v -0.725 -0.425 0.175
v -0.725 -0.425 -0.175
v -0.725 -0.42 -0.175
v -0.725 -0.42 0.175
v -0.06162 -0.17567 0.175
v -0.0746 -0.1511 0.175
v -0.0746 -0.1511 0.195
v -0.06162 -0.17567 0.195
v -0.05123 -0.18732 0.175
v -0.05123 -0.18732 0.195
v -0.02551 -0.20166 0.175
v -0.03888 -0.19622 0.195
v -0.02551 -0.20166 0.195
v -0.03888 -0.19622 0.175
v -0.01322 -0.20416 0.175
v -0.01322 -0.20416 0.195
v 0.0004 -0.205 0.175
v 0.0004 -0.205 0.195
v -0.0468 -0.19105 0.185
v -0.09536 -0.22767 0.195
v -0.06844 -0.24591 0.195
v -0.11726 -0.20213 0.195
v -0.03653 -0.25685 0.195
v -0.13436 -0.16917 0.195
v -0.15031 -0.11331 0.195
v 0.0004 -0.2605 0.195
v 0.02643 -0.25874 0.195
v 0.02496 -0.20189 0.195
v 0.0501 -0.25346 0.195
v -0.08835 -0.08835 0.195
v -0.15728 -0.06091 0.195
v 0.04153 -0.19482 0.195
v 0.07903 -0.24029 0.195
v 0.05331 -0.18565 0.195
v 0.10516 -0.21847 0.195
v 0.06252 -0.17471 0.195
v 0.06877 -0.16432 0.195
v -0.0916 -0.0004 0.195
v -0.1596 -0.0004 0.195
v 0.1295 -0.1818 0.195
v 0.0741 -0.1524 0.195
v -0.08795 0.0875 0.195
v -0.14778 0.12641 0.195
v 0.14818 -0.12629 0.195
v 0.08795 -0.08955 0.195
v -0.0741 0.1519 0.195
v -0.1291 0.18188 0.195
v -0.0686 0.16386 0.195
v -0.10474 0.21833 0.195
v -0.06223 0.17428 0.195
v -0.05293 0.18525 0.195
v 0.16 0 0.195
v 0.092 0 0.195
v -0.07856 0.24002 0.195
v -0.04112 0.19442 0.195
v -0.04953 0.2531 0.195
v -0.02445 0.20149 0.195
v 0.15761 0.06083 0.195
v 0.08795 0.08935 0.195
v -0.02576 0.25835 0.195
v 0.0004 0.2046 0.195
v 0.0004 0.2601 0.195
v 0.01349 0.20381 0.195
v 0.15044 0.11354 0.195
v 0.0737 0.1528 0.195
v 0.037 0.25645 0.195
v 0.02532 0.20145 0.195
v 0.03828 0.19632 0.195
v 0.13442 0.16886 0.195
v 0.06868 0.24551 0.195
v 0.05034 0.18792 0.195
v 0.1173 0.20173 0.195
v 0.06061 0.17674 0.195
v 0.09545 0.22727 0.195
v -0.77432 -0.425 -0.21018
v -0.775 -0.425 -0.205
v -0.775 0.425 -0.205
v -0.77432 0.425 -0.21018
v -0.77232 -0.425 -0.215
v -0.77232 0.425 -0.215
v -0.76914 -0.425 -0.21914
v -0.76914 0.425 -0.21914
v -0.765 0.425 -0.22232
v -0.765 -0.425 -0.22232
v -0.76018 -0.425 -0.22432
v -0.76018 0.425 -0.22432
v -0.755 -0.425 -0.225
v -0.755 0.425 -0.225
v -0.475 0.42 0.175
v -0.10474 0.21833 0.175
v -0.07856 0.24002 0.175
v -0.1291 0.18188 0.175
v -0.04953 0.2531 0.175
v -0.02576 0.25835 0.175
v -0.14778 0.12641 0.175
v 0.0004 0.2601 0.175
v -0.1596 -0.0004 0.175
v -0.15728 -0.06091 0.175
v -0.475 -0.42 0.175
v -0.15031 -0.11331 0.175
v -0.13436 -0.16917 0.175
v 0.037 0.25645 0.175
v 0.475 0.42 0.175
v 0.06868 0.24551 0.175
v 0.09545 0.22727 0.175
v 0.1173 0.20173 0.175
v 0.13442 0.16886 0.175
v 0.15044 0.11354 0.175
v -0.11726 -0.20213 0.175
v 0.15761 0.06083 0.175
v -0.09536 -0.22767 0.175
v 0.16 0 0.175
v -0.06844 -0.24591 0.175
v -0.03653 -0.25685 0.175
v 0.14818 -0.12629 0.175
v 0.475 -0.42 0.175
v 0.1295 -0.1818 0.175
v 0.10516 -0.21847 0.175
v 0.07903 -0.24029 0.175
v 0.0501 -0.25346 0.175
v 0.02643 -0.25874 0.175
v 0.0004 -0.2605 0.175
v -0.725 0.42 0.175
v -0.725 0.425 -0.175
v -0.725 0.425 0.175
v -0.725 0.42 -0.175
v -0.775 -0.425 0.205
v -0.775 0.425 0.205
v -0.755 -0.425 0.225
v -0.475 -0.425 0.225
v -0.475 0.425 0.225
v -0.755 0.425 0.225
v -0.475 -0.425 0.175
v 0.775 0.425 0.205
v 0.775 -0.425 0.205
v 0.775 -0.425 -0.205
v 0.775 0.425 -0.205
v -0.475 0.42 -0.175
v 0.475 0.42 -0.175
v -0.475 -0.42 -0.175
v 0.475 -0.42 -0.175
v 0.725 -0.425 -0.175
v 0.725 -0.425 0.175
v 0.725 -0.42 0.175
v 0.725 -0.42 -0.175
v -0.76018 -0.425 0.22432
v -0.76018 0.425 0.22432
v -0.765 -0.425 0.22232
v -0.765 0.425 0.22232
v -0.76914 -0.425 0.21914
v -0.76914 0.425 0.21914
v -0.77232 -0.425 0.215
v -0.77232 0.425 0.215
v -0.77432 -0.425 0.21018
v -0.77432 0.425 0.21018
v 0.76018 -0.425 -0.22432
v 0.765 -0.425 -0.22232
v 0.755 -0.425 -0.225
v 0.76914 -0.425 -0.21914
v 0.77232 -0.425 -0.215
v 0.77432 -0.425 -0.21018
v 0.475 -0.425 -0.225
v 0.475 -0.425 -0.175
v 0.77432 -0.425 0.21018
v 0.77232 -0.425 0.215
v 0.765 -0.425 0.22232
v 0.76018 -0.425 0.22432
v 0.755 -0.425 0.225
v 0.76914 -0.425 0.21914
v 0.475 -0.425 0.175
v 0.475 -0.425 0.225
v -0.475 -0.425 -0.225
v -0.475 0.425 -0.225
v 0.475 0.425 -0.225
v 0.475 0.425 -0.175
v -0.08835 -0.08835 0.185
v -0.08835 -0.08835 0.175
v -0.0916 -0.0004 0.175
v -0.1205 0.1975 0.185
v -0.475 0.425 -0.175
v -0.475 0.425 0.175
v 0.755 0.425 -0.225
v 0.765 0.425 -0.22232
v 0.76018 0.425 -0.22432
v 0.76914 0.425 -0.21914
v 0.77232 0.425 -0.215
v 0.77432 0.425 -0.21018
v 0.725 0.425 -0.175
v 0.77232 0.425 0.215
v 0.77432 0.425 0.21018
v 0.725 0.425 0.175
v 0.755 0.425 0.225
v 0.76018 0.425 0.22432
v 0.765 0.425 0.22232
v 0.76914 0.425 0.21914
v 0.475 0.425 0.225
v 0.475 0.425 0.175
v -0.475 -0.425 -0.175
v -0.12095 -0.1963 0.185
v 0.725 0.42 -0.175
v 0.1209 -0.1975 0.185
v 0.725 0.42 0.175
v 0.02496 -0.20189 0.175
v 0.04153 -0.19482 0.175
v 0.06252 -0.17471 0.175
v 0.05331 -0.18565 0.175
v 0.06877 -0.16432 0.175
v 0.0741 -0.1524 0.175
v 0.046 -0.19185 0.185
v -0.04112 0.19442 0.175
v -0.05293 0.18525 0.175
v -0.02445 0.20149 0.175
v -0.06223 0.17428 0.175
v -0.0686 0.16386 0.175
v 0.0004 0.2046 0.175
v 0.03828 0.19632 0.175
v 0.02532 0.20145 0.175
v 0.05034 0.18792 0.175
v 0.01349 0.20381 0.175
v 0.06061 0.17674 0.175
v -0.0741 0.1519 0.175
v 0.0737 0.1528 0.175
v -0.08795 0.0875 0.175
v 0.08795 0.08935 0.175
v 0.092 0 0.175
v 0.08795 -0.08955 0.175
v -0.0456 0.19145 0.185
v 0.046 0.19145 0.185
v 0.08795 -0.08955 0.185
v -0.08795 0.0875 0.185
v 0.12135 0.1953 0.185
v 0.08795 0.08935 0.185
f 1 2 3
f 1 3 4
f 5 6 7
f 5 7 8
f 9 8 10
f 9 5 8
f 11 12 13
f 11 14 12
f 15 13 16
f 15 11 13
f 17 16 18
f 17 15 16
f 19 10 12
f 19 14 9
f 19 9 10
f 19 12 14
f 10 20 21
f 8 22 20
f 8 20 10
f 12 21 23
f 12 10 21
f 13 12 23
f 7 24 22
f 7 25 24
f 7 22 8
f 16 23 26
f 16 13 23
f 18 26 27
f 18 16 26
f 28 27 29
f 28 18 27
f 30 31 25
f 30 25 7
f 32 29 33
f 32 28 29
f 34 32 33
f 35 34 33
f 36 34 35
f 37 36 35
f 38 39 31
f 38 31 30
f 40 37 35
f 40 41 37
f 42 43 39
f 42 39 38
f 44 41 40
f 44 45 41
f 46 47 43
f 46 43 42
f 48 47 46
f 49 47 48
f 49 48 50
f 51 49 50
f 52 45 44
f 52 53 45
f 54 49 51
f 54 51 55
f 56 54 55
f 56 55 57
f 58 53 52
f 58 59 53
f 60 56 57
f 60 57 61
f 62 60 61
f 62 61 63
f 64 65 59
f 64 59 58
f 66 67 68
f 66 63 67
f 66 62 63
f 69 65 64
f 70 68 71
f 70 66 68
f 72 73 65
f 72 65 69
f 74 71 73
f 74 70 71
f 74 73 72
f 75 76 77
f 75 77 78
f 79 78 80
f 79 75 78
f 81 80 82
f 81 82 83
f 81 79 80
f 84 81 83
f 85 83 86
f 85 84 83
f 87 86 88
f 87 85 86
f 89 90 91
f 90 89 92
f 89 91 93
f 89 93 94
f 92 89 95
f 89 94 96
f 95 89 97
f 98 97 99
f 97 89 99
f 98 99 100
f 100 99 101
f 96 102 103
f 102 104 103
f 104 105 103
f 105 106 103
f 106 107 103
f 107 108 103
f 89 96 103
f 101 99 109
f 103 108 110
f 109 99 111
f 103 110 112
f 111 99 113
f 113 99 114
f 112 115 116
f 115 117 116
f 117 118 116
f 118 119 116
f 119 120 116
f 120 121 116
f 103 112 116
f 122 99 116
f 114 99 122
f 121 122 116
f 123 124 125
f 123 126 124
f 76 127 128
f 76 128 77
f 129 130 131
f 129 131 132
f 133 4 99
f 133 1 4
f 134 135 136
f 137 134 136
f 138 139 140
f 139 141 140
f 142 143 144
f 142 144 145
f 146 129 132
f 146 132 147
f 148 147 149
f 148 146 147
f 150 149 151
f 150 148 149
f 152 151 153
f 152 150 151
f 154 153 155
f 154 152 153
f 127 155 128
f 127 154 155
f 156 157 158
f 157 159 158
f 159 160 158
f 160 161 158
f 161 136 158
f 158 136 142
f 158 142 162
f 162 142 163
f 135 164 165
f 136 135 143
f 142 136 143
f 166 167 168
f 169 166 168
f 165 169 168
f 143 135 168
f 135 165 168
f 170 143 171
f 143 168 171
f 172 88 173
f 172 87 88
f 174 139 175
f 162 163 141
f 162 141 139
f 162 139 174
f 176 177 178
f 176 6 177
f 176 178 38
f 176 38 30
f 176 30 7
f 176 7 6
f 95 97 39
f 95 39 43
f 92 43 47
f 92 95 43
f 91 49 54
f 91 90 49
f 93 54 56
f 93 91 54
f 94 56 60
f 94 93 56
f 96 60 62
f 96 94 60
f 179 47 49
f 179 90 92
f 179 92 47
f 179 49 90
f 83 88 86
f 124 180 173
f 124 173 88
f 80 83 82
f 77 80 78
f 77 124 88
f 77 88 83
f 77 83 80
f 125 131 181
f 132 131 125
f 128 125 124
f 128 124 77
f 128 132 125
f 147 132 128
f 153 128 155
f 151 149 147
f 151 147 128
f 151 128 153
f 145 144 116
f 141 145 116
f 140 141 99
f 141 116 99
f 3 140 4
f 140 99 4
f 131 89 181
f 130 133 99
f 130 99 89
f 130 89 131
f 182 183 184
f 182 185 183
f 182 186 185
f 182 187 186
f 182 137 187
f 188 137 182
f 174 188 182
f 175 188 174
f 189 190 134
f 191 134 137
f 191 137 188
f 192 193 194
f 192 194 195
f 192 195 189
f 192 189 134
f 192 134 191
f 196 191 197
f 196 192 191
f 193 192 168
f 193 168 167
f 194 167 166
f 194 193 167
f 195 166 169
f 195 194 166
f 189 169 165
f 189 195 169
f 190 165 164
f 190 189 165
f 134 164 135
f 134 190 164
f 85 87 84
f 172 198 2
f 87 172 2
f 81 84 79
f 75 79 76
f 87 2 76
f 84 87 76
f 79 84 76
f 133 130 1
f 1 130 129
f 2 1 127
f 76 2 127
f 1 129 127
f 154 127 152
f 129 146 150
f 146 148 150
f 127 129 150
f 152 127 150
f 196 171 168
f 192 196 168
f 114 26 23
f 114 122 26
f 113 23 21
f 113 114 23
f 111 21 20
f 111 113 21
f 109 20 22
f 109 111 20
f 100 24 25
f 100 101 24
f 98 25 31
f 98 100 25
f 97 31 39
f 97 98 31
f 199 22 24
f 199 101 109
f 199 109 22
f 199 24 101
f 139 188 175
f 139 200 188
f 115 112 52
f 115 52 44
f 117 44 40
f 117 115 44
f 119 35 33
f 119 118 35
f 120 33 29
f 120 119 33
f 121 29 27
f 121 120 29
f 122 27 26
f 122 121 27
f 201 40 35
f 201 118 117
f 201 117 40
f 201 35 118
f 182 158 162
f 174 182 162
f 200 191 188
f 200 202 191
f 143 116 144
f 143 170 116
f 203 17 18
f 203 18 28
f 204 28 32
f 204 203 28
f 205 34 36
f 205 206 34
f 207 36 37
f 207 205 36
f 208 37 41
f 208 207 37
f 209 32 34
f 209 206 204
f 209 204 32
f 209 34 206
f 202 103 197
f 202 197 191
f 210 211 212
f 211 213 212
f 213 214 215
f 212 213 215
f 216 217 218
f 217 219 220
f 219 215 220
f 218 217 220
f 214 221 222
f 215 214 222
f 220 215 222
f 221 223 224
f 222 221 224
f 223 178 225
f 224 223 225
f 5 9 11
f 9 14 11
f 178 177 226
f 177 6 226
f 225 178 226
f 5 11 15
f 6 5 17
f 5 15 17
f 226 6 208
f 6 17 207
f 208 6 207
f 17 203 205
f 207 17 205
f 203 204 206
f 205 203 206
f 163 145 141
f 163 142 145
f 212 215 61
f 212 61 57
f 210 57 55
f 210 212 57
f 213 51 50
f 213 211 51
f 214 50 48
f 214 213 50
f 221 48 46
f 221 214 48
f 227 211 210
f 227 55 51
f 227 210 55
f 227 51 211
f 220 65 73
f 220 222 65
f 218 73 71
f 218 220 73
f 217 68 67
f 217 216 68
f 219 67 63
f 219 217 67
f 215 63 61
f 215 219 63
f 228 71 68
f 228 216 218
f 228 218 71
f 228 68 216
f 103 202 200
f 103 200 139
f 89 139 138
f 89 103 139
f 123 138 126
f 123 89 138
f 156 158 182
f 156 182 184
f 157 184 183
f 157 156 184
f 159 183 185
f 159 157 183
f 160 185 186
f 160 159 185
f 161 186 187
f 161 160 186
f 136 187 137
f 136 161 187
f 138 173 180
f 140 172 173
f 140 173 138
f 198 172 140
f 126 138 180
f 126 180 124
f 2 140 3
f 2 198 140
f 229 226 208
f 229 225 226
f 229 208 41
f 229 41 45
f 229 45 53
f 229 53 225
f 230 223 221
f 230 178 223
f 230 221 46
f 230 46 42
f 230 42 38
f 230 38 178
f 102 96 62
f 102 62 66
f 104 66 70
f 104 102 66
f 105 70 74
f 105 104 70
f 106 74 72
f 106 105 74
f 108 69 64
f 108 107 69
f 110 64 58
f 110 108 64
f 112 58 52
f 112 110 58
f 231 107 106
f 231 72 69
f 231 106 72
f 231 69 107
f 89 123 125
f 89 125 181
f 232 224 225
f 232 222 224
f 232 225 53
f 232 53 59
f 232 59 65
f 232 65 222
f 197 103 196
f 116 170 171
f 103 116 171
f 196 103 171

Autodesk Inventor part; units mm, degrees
ref_plane "YZ Plane" through (0, 0, 0) normal (1, 0, 0) x (0, 1, 0)
ref_plane "XZ Plane" through (0, 0, 0) normal (0, 1, 0) x (-1, 0, 0)
ref_plane "XY Plane" through (0, 0, 0) normal (0, 0, 1) x (1, 0, 0)
sketch "Sketch1" plane through (0, 0, 0) normal (0, 1, 0) x (-1, 0, 0)
  line L0 (0.725, 0.175) -> (-0.725, 0.175)
  line L1 (-0.725, 0.175) -> (-0.725, -0.175)
  line L2 (-0.725, -0.175) -> (0.725, -0.175)
  line L3 (0.725, -0.175) -> (0.725, 0.175)
  line L4 (0.475, 0.175) -> (0.475, 0.225)
  line L5 (0.475, 0.225) -> (0.775, 0.225)
  line L6 (0.775, 0.225) -> (0.775, -0.225)
  line L7 (0.775, -0.225) -> (0.475, -0.225)
  line L8 (0.475, -0.225) -> (0.475, -0.175)
  line L9 (-0.475, 0.175) -> (-0.475, 0.225)
  line L10 (-0.475, 0.225) -> (-0.775, 0.225)
  line L11 (-0.775, 0.225) -> (-0.775, -0.225)
  line L12 (-0.775, -0.225) -> (-0.475, -0.225)
  line L13 (-0.475, -0.175) -> (-0.475, -0.225)
  line L14 (0.475, 0.175) -> (-0.475, 0.175)
  point P0 (0, 0)
  point P1 (0, 0.175)
  point P2 (0.725, 0)
  dimension "d0" = 1.55
  dimension "d1" = 0.05
  dimension "d2" = 0.05
  dimension "d3" = 0.45
  dimension "d4" = 0.3
extrude "Extrusion1" add sketch "Sketch1" along normal mid plane 0.85 contours L0 L4 L5 L6 L7 L8 L2 L3 | L0 L1 L2 L13 L12 L11 L10 L9
extrude "Extrusion2" add sketch "Sketch1" along normal mid plane 0.84 contours L3 L2 L1 L0
sketch "Sketch2" plane through (-0.475, -0.42, 0.175) normal (0, 0, 1) x (1, 0, 0)
  line L0 (0, 0) -> (0, 0.84) projected
  line L1 (0.95, 0) -> (0, 0) projected
  line L2 (0.95, 0) -> (0.95, 0.84) projected
  line L3 (0, 0.84) -> (0.95, 0.84) projected
  line L4 (0, 0.42) -> (0.95, 0.42) construction
  spline S0 degree 2 poles (0.635, 0.42) (0.635, 0.2855) (0.5568, 0.1595) (0.4754, 0.1595) knots 0 0 0 1 2 2 2
  spline S1 degree 2 poles (0.4754, 0.1595) (0.3927, 0.1595) (0.3154, 0.2879) (0.3154, 0.4196) knots 0 0 0 1 2 2 2
  spline S2 degree 2 poles (0.3154, 0.4196) (0.3154, 0.5549) (0.3936, 0.6801) (0.4754, 0.6801) knots 0 0 0 1 2 2 2
  spline S3 degree 2 poles (0.4754, 0.6801) (0.5577, 0.6801) (0.635, 0.5505) (0.635, 0.42) knots 0 0 0 1 2 2 2
  spline S4 degree 2 poles (0.5491, 0.2676) (0.5589, 0.2924) (0.567, 0.3685) (0.567, 0.42) knots 0 0 0 1 2 2 2
  spline S5 degree 2 poles (0.567, 0.42) (0.567, 0.4715) (0.5589, 0.5472) (0.5487, 0.5728) knots 0 0 0 1 2 2 2
  spline S6 degree 2 poles (0.5487, 0.5728) (0.5386, 0.5983) (0.5034, 0.6246) (0.4754, 0.6246) knots 0 0 0 1 2 2 2
  spline S7 degree 2 poles (0.4754, 0.6246) (0.4474, 0.6246) (0.4114, 0.5983) (0.4009, 0.5719) knots 0 0 0 1 2 2 2
  spline S8 degree 2 poles (0.4009, 0.5719) (0.3907, 0.5464) (0.3834, 0.4686) (0.3834, 0.4196) knots 0 0 0 1 2 2 2
  spline S9 degree 2 poles (0.3834, 0.4196) (0.3834, 0.3669) (0.3899, 0.2964) (0.4004, 0.2689) knots 0 0 0 1 2 2 2
  spline S10 degree 2 poles (0.4004, 0.2689) (0.4102, 0.2429) (0.4462, 0.215) (0.4754, 0.215) knots 0 0 0 1 2 2 2
  spline S11 degree 2 poles (0.4754, 0.215) (0.503, 0.215) (0.539, 0.2413) (0.5491, 0.2676) knots 0 0 0 1 2 2 2
  point P0 (0.475, 0.42)
extrude "Extrusion3" add sketch "Sketch2" along normal blind 0.02 contours S0 S1 S2 S3
fillet "Fillet1" radius 0.02 4 edges at (-0.775, 0, 0.225) (-0.775, 0, -0.225) (0.775, 0, 0.225) (0.775, 0, -0.225)
equation "\"d2\" = d1"
properties part number "21-1001" material "Copper"
